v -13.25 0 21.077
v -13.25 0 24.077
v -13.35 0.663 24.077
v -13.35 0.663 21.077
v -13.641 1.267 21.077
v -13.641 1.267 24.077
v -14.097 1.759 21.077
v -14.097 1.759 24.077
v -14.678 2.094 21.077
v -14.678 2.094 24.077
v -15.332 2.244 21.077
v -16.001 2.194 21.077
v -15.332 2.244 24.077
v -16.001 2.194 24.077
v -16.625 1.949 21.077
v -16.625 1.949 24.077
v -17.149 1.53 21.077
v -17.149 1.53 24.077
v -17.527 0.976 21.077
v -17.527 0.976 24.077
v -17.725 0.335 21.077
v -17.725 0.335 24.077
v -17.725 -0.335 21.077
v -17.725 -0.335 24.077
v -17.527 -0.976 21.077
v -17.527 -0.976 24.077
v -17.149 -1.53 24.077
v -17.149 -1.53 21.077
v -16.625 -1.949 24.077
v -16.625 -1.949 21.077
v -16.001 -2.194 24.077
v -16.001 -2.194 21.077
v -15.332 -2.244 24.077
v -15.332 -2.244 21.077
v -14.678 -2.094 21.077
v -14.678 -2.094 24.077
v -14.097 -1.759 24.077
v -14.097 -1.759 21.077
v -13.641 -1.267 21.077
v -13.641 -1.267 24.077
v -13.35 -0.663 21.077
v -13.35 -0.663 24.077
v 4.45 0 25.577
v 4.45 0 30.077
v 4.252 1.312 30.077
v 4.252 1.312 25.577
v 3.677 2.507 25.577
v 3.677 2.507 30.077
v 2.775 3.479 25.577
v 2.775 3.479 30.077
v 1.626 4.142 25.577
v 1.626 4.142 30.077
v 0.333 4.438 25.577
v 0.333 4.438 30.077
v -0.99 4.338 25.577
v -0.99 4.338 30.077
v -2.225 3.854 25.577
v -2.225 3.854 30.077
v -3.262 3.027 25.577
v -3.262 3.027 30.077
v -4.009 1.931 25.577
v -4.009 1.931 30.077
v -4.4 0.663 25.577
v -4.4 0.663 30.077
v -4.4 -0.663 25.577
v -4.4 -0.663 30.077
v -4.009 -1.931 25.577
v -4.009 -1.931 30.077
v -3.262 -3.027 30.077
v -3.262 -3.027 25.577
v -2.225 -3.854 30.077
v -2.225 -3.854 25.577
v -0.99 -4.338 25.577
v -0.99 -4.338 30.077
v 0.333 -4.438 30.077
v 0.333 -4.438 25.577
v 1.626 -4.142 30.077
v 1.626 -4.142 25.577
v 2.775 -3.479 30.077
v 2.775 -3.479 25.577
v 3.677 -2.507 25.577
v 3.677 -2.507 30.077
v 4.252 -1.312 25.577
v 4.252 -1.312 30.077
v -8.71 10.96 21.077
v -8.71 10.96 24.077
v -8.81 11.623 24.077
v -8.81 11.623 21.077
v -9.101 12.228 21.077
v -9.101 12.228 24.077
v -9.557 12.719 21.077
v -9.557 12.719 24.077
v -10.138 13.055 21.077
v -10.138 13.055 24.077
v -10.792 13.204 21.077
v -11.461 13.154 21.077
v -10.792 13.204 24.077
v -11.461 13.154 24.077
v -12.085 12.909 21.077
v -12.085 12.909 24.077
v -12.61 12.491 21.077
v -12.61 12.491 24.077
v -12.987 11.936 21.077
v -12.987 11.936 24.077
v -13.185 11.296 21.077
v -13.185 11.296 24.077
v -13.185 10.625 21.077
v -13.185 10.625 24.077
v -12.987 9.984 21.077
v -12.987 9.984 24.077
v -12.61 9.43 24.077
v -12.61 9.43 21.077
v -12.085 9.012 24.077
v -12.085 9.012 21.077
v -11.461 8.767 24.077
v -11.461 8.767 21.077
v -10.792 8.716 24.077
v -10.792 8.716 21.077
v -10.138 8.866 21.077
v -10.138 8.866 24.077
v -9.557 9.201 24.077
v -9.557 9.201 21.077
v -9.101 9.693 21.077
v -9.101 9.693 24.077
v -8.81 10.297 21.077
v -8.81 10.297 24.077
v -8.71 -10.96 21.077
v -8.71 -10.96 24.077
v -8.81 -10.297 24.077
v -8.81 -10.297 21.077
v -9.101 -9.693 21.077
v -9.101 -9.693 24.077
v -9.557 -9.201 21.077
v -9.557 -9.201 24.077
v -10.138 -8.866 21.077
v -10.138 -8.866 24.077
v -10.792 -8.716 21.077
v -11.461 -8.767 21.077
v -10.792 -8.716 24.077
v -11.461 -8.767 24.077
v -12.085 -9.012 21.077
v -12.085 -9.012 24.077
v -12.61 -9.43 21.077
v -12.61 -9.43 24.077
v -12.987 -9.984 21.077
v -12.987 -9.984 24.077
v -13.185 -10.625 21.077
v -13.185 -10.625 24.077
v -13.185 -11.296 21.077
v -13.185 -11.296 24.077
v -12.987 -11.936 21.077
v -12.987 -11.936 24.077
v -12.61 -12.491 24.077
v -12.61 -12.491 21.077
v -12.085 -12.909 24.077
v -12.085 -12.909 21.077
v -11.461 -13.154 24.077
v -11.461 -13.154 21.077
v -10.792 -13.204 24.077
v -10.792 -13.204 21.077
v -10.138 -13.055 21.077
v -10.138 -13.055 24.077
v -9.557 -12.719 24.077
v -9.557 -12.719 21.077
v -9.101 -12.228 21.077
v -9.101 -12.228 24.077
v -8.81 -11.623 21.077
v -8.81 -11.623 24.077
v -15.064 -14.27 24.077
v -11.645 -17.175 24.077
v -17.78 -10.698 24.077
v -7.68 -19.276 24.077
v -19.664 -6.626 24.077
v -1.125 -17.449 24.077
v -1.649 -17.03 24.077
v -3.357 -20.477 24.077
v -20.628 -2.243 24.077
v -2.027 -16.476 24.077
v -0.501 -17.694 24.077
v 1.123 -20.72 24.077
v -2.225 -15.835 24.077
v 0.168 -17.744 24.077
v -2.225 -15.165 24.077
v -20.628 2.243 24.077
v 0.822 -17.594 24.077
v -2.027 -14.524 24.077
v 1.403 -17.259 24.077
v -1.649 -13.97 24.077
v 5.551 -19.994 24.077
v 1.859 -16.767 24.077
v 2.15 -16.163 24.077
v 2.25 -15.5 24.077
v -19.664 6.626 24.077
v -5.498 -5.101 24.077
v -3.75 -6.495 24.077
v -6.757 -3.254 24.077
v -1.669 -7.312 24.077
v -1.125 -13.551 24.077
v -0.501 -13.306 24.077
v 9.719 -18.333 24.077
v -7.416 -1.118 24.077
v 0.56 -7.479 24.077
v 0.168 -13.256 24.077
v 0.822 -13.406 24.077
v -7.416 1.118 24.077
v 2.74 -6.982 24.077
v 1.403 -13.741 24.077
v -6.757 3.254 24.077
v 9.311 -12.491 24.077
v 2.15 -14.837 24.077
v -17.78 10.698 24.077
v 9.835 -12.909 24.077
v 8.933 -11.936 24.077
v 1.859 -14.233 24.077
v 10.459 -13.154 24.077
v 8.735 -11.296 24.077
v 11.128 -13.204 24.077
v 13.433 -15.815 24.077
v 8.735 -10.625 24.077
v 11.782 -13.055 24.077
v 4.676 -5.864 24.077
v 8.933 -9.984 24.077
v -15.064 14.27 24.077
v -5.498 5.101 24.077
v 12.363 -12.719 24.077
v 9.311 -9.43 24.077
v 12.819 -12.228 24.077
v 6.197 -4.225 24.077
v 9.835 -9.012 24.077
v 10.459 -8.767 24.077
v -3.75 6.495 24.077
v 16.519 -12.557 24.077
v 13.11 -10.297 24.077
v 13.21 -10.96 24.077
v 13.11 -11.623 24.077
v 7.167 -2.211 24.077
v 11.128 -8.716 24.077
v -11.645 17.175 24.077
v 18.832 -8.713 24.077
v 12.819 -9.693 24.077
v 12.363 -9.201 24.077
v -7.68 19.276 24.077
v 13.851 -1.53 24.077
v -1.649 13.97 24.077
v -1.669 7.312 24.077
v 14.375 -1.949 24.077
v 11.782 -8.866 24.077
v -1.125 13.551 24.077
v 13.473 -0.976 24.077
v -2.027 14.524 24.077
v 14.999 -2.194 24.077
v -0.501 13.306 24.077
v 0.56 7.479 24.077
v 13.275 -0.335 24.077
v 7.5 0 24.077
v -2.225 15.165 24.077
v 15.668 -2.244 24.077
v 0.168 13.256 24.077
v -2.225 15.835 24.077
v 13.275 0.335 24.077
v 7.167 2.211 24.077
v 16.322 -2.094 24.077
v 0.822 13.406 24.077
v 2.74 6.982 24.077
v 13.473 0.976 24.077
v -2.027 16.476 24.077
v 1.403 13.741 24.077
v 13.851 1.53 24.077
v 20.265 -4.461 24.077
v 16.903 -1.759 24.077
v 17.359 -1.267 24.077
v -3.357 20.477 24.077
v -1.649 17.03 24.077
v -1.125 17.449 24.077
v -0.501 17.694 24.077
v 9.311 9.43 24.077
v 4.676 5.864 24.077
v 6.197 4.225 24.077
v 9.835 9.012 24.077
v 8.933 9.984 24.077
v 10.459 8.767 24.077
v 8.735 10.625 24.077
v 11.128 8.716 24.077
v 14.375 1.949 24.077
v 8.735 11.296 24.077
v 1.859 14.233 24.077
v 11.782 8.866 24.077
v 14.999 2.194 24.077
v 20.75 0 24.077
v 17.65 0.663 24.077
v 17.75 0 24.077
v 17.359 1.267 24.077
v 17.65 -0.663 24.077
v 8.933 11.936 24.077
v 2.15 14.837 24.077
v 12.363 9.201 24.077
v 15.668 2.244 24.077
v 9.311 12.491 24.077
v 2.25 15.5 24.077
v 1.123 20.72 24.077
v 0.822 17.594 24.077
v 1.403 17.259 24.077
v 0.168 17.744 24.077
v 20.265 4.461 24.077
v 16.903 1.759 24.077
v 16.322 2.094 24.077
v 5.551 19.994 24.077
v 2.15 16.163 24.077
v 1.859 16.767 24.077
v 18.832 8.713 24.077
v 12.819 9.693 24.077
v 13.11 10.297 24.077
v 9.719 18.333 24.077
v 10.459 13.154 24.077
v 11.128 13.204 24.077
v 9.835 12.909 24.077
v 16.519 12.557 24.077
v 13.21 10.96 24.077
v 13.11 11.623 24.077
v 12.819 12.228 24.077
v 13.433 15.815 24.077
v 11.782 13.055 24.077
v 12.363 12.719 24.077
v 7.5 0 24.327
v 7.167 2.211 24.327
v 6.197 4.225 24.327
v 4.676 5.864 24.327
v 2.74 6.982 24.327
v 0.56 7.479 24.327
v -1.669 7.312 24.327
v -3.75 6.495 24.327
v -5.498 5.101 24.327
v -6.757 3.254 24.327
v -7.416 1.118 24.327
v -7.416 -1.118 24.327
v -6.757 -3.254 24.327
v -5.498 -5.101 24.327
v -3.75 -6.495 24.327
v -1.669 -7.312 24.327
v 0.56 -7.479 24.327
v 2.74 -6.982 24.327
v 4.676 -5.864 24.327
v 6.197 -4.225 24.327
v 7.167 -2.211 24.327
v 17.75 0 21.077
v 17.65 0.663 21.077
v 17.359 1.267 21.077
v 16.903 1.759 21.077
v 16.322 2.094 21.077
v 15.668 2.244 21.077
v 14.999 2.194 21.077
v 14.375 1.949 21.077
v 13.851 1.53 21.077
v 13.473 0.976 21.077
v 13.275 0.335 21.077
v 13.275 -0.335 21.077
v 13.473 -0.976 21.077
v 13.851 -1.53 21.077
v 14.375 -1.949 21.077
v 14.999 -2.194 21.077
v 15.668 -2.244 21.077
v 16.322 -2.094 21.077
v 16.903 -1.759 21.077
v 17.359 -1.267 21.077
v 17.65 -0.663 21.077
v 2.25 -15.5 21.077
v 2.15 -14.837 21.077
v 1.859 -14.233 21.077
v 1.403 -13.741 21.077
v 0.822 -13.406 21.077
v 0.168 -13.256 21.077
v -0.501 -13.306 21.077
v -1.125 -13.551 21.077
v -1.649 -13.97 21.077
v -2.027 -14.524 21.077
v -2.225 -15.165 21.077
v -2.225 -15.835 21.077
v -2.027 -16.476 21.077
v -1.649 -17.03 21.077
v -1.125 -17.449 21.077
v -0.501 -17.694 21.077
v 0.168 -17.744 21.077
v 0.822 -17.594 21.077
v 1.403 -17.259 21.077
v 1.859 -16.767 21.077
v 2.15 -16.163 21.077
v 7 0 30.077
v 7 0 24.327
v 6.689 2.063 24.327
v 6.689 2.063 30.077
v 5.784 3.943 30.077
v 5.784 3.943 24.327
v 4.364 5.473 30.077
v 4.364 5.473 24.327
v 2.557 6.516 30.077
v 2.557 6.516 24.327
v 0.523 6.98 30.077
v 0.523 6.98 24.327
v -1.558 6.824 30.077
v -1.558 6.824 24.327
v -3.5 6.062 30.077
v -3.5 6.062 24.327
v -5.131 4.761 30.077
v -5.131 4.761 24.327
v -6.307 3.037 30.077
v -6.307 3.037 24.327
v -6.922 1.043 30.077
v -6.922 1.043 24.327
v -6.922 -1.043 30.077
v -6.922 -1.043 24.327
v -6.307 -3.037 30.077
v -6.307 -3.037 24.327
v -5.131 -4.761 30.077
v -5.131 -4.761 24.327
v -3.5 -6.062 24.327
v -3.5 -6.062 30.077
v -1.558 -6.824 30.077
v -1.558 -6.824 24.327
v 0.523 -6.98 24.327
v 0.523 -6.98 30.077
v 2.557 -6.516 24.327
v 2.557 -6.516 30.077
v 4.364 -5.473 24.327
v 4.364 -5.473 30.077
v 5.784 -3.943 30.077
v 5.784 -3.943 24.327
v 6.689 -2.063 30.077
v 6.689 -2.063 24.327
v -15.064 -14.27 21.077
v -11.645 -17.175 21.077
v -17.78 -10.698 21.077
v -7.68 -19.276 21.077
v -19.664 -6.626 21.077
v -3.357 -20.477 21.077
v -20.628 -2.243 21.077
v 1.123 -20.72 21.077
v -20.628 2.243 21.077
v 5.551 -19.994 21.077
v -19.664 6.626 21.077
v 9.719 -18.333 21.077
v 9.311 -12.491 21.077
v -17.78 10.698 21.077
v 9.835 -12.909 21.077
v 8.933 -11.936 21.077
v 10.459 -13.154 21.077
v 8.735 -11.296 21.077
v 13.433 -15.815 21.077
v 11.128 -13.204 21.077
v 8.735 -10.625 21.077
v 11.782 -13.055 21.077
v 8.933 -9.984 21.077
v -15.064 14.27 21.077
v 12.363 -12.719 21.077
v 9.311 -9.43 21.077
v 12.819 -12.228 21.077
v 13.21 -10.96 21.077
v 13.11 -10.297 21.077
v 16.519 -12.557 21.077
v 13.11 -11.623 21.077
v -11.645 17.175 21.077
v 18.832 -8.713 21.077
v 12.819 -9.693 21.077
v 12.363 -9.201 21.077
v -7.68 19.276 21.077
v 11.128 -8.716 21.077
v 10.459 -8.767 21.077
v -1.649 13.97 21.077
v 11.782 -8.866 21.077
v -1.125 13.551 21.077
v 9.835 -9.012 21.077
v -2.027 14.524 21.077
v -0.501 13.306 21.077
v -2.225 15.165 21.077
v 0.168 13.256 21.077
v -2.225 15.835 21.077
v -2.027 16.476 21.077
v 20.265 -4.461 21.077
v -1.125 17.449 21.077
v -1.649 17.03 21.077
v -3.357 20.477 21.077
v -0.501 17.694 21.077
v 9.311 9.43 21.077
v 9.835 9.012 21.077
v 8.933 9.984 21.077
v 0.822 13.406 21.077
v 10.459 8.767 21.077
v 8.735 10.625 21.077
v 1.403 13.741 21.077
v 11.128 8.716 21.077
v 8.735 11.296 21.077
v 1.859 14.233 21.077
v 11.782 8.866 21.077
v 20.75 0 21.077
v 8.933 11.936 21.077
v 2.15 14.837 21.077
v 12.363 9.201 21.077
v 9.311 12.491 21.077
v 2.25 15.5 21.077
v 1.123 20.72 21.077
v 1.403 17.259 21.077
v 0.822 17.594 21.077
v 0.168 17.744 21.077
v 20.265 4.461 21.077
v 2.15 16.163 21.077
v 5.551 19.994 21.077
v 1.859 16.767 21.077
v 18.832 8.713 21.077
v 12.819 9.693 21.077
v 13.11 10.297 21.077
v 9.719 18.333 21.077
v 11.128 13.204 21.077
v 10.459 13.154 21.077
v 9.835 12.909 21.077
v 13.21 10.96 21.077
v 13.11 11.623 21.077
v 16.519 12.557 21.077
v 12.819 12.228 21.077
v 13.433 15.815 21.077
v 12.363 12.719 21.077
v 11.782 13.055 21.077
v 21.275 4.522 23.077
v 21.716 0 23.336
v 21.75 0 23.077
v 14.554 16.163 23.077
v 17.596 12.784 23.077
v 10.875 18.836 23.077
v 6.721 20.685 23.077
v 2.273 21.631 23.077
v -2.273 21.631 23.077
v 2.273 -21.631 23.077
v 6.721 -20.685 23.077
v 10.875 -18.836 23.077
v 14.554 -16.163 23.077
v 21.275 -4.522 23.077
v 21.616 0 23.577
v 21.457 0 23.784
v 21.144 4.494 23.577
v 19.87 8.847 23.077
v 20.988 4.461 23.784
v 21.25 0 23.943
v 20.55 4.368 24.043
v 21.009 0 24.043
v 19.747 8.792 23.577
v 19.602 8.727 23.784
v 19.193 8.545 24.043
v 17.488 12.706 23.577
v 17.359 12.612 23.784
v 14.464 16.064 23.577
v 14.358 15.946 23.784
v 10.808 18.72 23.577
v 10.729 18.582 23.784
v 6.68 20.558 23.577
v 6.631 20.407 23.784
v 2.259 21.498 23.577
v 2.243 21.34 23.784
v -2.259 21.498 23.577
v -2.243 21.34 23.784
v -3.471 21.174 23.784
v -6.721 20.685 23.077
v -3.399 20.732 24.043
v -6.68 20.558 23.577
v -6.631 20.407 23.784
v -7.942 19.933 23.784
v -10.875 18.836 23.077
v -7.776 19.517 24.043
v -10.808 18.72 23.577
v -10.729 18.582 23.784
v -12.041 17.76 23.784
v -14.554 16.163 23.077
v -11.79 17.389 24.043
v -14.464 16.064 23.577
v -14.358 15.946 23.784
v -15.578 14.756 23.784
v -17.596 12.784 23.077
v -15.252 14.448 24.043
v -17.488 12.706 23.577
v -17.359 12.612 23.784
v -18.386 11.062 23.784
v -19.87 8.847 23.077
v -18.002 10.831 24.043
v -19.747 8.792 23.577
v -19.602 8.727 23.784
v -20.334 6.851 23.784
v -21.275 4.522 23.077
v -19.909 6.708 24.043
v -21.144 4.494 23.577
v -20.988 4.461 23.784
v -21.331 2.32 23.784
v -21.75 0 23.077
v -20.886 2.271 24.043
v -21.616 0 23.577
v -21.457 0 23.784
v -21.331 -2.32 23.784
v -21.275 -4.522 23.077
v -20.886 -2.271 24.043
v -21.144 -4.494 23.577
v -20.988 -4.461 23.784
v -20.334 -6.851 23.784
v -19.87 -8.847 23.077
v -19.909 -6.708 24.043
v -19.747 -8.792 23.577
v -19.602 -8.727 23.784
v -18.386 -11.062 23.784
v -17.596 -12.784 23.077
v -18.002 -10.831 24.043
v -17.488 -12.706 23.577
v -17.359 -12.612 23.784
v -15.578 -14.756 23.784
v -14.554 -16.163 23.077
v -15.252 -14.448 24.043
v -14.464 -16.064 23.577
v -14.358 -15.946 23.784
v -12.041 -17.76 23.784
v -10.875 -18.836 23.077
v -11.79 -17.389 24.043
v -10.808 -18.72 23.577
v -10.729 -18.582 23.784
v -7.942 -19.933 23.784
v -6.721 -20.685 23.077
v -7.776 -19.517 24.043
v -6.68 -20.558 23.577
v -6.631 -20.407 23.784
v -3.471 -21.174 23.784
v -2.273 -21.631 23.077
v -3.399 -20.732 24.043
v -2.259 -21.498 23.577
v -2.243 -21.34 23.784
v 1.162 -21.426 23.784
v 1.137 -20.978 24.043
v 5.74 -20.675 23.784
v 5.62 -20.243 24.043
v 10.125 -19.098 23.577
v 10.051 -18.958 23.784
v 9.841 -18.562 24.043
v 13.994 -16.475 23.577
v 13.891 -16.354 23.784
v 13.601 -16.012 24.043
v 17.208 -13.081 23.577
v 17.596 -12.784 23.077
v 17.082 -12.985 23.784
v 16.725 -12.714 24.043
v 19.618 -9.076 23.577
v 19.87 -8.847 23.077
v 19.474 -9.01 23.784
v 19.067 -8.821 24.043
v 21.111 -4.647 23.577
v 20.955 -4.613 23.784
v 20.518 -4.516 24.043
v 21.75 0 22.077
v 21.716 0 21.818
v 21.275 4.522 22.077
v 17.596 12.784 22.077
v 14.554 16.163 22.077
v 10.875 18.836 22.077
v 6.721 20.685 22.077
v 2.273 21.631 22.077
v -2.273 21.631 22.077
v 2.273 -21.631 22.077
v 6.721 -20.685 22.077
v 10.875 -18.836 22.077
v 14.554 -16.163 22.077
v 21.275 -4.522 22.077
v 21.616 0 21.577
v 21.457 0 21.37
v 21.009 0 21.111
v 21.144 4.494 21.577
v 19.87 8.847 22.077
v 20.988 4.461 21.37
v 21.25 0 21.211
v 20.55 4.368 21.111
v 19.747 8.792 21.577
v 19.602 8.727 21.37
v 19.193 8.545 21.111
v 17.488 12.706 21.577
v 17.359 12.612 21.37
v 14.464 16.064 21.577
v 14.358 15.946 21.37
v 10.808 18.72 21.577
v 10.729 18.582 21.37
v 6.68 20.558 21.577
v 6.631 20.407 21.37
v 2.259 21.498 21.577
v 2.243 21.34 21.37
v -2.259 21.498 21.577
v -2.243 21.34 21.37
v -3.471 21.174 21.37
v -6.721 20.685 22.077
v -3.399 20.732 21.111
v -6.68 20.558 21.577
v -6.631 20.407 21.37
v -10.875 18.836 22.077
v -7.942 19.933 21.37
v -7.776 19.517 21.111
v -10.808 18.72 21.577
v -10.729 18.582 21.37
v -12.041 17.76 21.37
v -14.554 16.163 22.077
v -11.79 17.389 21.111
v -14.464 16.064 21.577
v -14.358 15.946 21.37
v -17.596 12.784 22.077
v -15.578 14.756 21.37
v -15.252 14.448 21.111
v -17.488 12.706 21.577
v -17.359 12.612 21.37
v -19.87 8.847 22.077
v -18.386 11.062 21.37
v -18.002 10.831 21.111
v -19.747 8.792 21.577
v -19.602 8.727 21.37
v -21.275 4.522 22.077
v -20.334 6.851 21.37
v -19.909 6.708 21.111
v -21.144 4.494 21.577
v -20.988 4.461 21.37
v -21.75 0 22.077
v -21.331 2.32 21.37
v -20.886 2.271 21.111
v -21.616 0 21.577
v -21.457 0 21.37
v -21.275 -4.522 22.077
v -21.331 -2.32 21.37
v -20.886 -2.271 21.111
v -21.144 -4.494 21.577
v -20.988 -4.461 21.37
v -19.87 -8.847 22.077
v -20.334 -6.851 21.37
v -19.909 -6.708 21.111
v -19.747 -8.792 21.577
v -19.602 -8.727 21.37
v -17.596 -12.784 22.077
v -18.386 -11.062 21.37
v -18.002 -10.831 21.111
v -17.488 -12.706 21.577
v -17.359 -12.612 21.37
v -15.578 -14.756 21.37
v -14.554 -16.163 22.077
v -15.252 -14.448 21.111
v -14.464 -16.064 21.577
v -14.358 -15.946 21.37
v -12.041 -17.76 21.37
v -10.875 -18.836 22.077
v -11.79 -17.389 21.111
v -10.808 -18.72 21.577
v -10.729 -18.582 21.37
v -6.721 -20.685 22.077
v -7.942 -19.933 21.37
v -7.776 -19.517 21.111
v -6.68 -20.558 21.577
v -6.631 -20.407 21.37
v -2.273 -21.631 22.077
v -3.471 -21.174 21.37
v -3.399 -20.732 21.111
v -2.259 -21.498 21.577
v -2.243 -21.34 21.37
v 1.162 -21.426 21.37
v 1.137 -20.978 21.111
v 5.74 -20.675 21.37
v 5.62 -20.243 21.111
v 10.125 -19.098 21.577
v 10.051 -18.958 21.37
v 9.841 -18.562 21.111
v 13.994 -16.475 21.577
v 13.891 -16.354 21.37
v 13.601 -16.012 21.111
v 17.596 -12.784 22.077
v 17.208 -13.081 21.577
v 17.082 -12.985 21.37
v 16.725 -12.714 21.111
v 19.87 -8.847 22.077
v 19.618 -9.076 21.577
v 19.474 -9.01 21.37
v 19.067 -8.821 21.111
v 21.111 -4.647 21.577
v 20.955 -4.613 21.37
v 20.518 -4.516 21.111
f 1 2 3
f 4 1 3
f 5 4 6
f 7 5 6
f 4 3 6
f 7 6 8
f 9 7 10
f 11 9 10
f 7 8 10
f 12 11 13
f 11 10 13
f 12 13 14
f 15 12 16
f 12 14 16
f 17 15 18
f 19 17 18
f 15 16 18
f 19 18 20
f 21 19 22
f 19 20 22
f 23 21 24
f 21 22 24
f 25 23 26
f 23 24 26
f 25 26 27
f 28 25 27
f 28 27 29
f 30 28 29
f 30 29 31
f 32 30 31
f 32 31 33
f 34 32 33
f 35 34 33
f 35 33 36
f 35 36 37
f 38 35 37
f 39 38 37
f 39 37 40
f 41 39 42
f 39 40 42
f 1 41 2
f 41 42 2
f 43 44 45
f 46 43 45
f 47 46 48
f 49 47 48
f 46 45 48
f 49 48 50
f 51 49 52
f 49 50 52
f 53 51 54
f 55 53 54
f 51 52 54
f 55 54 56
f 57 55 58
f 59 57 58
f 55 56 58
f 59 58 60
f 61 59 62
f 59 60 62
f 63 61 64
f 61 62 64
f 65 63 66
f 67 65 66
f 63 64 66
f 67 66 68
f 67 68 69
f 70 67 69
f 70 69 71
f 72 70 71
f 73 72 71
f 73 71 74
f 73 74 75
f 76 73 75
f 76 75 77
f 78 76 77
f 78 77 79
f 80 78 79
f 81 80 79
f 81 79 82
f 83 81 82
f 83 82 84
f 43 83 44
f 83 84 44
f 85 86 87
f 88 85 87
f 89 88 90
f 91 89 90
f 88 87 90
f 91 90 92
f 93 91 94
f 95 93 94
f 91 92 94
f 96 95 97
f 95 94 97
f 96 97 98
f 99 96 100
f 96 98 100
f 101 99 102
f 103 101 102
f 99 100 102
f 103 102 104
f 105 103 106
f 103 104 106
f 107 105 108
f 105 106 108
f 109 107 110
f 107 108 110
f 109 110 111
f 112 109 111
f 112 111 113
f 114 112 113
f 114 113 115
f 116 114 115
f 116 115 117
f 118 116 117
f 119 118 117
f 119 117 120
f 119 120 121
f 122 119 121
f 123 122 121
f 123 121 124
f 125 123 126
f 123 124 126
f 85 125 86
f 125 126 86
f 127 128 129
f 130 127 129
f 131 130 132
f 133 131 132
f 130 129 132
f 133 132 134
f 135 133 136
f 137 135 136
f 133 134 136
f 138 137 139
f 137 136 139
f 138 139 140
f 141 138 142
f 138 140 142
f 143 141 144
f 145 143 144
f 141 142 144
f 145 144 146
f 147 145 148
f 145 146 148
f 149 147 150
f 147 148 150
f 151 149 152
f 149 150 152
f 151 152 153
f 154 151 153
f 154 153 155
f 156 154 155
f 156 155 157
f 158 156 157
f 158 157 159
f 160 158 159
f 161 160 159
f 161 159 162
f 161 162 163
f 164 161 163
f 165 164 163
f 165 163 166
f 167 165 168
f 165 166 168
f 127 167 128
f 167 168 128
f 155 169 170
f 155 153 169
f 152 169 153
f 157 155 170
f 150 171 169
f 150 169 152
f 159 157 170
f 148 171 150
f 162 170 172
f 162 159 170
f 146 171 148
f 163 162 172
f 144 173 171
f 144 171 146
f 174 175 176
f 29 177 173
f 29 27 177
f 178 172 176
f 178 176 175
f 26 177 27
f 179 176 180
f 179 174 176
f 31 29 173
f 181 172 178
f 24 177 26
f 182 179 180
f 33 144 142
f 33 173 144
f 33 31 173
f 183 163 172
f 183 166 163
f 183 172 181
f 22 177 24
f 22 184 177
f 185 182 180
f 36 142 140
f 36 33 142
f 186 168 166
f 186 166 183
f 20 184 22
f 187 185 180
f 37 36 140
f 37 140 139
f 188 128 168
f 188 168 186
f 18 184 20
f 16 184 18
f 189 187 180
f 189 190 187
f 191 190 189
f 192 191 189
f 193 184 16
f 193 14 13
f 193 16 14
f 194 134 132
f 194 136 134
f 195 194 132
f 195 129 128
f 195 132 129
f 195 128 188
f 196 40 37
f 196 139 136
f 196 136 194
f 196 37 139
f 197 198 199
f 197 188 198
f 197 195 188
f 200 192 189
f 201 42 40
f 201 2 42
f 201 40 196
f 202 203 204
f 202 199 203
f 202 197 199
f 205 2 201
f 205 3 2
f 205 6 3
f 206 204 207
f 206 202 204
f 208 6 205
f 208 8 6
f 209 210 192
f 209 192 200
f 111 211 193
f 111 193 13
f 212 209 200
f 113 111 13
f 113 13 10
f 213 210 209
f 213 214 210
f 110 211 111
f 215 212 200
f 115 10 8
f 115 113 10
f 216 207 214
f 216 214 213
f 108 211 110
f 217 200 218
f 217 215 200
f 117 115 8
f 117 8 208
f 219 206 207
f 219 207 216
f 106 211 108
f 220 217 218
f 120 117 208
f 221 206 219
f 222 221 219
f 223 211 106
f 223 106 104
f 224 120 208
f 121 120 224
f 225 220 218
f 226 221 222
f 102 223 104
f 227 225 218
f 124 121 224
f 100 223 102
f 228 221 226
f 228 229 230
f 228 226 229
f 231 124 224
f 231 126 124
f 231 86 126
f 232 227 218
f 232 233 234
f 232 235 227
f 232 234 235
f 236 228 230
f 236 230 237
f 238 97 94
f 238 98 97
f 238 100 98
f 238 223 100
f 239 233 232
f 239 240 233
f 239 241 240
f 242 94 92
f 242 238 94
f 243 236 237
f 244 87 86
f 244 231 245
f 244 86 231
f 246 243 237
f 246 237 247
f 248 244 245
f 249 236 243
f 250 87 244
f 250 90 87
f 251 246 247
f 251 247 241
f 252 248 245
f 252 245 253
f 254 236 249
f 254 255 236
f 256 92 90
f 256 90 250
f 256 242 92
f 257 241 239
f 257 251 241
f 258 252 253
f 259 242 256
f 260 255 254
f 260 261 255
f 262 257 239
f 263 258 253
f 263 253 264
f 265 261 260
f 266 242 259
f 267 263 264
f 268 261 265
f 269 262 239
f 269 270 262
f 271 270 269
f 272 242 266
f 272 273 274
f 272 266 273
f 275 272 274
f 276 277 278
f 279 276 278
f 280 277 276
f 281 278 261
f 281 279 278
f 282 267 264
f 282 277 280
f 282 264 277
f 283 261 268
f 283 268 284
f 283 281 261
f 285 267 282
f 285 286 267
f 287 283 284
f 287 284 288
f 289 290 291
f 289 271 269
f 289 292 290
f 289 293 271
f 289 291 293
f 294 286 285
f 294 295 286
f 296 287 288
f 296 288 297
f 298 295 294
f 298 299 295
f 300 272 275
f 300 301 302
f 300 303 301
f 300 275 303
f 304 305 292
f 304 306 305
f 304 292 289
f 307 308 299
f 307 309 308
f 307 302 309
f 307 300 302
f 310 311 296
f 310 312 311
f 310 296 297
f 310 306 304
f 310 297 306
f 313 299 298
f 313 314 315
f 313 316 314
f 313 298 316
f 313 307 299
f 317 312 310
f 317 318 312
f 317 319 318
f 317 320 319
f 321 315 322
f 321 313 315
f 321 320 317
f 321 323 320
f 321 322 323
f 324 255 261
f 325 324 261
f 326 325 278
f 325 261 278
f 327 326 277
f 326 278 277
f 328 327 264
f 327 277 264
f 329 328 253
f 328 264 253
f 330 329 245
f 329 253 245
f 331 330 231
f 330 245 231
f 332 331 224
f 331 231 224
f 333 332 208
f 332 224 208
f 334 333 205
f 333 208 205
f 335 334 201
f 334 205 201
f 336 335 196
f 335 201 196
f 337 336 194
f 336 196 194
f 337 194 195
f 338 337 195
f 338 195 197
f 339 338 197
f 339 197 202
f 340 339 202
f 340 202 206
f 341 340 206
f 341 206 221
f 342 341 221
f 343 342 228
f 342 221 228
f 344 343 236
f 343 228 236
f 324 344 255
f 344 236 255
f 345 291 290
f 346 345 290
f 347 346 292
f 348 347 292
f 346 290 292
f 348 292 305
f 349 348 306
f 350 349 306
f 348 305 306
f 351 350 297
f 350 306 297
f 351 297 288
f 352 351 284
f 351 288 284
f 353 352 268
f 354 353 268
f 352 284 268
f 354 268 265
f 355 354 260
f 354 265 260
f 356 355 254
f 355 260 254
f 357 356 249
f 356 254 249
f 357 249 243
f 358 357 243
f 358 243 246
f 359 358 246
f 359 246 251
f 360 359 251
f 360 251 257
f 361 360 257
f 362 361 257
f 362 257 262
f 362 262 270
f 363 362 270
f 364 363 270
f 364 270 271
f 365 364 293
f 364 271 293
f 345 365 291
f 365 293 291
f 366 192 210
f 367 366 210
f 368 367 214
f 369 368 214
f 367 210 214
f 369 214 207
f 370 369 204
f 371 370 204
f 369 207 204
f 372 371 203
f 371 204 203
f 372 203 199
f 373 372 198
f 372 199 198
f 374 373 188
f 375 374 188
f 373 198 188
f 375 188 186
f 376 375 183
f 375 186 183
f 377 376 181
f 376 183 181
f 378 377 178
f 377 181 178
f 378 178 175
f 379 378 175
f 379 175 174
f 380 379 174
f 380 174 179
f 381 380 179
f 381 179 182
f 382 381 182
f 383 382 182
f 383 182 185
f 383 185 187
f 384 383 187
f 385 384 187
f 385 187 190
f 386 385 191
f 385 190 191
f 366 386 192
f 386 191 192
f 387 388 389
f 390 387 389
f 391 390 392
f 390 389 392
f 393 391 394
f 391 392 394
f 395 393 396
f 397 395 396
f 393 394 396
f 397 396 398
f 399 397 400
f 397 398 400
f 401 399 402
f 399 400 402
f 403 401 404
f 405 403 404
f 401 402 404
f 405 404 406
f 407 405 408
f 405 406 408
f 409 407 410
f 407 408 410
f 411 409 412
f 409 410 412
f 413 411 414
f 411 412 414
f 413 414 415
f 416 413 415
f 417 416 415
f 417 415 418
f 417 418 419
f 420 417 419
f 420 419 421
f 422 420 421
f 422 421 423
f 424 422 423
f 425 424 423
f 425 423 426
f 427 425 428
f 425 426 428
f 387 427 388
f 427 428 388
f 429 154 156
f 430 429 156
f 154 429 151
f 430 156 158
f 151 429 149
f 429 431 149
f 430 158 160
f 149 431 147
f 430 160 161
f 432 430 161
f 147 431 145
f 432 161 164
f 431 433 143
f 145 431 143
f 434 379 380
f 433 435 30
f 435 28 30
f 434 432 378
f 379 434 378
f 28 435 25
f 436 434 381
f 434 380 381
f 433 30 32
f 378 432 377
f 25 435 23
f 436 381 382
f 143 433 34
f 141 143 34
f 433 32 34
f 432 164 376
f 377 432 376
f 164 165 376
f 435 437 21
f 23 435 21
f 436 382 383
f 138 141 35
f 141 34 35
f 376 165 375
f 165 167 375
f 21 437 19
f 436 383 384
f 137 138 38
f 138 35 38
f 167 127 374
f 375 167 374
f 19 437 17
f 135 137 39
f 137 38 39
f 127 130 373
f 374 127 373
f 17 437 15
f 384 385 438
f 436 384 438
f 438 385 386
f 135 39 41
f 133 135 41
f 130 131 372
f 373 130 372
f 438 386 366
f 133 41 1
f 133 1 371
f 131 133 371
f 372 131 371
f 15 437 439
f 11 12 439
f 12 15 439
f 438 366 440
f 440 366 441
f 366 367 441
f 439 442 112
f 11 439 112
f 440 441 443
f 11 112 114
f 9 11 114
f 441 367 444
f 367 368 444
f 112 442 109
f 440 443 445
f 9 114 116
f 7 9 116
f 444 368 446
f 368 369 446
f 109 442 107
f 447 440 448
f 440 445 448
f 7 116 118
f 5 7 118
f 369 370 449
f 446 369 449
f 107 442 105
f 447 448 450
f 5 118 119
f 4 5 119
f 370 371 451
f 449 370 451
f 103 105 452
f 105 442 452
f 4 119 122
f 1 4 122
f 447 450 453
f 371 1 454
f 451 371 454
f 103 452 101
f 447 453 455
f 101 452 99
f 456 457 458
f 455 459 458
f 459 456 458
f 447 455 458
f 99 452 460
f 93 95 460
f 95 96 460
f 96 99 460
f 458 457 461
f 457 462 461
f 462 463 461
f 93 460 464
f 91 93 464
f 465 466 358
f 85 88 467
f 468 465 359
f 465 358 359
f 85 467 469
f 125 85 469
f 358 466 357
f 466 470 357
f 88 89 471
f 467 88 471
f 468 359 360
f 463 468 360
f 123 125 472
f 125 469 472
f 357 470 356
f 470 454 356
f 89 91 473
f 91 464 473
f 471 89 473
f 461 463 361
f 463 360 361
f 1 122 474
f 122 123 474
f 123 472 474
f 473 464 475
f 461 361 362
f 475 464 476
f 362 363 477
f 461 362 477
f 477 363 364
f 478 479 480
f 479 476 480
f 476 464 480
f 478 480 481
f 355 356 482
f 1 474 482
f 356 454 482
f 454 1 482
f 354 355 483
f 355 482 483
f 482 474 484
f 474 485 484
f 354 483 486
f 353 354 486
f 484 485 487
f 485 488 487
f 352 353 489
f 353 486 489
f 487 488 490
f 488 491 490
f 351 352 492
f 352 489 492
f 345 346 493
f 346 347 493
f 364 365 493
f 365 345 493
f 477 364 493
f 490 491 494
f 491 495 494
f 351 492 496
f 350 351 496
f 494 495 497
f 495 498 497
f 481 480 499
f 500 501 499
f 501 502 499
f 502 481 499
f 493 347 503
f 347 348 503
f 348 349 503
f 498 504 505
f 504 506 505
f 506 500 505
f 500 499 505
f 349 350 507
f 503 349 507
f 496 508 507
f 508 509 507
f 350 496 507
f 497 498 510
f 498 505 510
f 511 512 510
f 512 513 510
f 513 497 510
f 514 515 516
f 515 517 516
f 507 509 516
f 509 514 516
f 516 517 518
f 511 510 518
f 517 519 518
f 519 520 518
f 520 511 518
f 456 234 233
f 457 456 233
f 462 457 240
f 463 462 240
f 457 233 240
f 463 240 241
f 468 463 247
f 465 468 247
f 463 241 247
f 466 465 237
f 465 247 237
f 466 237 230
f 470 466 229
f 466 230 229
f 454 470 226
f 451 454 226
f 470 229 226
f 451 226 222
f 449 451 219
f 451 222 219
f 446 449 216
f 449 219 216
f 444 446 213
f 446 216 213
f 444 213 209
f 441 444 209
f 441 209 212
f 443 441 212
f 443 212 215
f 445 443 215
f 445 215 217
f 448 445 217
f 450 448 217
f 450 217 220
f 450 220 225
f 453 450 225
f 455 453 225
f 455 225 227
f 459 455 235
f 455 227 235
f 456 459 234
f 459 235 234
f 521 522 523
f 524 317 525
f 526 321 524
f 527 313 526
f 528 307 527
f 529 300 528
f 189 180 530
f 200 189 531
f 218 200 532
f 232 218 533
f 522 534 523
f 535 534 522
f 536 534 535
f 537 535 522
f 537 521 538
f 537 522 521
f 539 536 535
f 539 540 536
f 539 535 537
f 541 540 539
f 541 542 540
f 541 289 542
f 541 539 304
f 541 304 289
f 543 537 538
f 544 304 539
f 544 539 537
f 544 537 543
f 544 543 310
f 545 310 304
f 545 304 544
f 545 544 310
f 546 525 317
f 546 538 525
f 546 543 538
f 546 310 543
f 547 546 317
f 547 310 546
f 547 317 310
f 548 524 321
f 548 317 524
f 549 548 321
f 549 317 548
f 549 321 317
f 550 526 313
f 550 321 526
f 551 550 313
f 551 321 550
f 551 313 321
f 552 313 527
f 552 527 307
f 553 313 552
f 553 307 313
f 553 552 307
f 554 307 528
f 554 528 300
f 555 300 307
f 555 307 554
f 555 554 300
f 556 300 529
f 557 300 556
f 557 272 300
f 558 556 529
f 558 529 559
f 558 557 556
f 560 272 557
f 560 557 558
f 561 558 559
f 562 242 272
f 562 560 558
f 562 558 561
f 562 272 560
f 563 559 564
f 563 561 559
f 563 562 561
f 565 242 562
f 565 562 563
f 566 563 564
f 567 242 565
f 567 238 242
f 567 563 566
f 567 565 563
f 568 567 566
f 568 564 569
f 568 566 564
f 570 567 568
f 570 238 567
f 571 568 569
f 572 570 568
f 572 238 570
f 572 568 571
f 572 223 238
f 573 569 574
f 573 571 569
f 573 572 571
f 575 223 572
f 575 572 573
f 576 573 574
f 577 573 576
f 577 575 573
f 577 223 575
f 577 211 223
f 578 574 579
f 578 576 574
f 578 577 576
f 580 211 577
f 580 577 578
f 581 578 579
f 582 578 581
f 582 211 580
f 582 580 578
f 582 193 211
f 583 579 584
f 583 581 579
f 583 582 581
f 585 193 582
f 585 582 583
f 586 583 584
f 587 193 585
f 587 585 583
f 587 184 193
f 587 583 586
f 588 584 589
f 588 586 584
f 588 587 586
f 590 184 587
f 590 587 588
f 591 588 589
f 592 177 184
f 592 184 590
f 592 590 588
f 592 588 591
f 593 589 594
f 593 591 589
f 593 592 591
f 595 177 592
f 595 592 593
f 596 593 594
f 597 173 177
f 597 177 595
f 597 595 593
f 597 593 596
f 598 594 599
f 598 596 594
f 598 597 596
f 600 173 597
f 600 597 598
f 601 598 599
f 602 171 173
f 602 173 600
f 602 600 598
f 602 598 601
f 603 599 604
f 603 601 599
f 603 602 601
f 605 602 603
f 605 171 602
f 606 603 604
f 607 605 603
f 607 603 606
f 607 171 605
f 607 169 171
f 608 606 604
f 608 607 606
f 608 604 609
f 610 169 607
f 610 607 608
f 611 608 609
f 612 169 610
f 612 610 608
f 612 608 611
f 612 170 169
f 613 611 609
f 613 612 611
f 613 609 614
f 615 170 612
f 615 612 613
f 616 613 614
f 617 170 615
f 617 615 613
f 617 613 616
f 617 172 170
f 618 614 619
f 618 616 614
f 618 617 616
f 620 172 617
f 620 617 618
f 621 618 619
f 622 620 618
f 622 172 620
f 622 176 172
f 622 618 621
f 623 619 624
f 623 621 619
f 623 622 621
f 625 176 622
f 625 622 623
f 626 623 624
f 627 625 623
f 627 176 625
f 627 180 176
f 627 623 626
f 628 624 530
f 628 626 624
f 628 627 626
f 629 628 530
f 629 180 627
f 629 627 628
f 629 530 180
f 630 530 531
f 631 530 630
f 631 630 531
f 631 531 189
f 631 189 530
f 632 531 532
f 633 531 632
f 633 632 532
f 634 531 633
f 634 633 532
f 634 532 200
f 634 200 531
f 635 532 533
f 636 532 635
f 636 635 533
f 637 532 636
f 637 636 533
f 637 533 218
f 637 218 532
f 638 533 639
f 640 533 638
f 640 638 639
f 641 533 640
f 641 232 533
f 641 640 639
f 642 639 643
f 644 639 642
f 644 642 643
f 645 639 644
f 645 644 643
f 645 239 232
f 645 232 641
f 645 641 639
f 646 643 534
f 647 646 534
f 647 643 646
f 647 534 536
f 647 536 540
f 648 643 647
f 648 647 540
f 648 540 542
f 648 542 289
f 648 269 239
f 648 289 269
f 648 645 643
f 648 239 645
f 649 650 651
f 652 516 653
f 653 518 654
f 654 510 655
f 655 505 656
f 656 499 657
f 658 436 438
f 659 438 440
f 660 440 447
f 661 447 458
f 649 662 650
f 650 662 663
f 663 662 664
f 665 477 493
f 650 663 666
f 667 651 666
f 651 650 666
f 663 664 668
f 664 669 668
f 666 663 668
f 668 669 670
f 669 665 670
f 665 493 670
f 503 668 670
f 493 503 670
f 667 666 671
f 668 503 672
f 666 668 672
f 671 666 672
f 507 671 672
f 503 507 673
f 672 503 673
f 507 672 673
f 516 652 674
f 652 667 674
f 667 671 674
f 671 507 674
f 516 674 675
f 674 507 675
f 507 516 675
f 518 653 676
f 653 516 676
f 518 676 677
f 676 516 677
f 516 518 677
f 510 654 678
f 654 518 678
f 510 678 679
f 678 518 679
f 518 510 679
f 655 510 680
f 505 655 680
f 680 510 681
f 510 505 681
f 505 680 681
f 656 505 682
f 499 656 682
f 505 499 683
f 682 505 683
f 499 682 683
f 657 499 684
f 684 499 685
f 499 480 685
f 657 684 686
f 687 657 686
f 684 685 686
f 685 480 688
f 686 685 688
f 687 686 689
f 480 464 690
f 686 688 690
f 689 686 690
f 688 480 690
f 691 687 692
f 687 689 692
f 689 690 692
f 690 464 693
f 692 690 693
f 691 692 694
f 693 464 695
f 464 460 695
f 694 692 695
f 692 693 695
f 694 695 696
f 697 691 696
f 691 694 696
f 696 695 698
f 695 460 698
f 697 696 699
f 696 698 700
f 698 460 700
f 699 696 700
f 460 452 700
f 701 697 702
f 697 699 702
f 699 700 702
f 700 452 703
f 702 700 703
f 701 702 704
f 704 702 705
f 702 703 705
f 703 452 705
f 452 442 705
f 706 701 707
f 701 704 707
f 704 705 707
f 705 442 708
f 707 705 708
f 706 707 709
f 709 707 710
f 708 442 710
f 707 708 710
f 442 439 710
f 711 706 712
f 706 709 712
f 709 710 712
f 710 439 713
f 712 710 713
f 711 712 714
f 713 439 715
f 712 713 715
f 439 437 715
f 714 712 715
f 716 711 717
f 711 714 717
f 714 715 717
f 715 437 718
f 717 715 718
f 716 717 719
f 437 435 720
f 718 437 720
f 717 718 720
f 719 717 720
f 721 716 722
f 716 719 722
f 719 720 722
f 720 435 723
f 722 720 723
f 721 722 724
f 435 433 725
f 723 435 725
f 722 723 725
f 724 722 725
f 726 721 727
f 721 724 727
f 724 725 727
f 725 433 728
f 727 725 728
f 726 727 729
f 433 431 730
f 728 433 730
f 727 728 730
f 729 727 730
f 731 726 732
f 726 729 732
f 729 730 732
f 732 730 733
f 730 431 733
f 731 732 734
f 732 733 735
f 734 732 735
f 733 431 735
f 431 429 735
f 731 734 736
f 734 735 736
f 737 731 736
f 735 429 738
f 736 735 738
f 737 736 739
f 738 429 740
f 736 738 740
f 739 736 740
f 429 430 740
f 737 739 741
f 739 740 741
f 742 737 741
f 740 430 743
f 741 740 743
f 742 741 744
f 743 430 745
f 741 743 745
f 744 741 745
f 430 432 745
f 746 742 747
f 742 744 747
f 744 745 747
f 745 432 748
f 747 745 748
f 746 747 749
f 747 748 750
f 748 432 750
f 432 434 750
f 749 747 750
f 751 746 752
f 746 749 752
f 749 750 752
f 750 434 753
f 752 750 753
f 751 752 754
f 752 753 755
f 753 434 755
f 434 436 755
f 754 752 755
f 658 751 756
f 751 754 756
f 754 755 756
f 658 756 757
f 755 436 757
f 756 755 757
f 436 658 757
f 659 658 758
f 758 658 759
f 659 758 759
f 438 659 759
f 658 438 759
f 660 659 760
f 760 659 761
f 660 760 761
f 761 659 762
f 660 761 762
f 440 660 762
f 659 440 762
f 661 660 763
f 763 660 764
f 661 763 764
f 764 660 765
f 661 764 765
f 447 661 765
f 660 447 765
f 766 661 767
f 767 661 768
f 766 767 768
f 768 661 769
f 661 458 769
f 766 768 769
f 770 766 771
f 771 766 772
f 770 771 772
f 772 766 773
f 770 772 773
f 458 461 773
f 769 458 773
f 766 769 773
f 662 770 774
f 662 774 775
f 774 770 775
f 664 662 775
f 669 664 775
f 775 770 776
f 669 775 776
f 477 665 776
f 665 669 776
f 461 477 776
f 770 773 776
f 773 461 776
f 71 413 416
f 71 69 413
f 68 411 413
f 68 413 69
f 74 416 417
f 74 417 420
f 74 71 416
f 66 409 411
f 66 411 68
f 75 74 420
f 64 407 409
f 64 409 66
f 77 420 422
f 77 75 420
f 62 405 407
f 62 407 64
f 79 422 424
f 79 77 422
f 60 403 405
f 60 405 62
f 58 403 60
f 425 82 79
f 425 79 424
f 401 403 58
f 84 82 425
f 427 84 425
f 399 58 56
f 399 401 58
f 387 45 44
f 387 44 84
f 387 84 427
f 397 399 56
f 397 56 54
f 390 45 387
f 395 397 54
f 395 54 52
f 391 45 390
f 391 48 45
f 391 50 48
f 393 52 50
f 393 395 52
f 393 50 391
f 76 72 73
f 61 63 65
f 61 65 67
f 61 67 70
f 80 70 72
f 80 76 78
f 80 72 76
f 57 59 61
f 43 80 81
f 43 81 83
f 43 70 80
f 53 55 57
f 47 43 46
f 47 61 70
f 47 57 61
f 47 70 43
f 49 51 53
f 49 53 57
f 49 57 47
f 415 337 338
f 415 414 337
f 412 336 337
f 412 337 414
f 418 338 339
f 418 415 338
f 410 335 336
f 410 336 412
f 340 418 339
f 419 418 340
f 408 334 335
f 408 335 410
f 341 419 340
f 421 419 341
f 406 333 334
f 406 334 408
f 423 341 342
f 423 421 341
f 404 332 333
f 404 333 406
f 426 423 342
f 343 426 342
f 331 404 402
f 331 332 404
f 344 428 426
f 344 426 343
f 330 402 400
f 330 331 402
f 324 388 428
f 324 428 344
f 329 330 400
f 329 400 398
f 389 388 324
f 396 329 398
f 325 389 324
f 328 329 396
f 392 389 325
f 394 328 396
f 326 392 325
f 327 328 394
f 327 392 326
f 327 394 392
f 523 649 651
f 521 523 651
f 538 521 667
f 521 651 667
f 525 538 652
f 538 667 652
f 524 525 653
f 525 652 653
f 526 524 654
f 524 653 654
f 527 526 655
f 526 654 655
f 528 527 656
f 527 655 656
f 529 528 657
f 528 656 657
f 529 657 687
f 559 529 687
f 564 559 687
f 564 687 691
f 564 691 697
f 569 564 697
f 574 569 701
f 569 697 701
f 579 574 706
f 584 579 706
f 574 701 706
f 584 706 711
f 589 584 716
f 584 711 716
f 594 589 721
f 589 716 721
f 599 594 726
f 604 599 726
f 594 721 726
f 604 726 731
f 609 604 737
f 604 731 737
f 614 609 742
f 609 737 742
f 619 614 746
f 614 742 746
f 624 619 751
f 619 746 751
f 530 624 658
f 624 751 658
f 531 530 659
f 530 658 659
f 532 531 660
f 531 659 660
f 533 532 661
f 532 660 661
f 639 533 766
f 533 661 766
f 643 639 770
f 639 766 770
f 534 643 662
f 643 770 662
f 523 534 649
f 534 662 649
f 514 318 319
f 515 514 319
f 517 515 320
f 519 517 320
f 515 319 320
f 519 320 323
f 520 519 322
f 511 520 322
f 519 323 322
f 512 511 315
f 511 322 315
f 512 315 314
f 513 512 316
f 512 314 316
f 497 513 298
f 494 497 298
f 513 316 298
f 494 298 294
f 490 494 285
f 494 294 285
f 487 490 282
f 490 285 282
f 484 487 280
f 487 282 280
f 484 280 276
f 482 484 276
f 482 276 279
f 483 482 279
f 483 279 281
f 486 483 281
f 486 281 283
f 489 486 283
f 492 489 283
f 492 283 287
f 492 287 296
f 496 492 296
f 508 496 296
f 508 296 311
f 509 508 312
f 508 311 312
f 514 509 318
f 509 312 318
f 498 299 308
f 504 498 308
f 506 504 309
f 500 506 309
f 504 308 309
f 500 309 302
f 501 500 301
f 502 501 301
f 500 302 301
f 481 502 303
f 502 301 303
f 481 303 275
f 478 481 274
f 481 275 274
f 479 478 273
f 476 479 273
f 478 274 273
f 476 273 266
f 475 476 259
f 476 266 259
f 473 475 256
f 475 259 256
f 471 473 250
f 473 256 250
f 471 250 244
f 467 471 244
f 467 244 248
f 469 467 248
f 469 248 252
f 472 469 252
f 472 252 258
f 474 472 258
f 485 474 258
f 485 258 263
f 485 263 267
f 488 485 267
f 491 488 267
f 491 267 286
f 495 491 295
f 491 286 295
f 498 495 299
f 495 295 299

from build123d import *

# Parameters (mm, degrees)
SKETCH1_R           = 217.5
BOSS_EXTRUDE1_DEPTH = 30
SKETCH2_R           = 75
BOSS_EXTRUDE2_DEPTH = 2.5
SKETCH3_R           = 70
BOSS_EXTRUDE3_DEPTH = 57.5
SKETCH12_R          = 22.5
CUT_EXTRUDE2_DEPTH  = 30
FILLET2_R           = 10
SCALE2_SCALE        = 0.1
SKETCH14_R          = 4.45
CUT_EXTRUDE3_DEPTH  = 4.5


with BuildPart() as part:
    # Sketch1 → Boss-Extrude1 (new body)
    with BuildSketch(Plane.XY):
        Circle(SKETCH1_R)
    extrude(amount=BOSS_EXTRUDE1_DEPTH)

    # Sketch2 → Boss-Extrude2 (add)
    with BuildSketch(Plane.XY.offset(30)):
        Circle(SKETCH2_R)
    extrude(amount=BOSS_EXTRUDE2_DEPTH)

    # Sketch3 → Boss-Extrude3 (add)
    with BuildSketch(Plane.XY.offset(32.5)):
        Circle(SKETCH3_R)
    extrude(amount=BOSS_EXTRUDE3_DEPTH)

    # Sketch12 → Cut-Extrude2 (cut)
    with BuildSketch(Plane.XY.offset(30)):
        with Locations((0, 155)):
            Circle(SKETCH12_R)
        with Locations((109.601551084, 109.601551084)):
            Circle(SKETCH12_R)
        with Locations((155, 0)):
            Circle(SKETCH12_R)
        with Locations((109.601551084, -109.601551084)):
            Circle(SKETCH12_R)
        with Locations((0, -155)):
            Circle(SKETCH12_R)
        with Locations((-109.601551084, -109.601551084)):
            Circle(SKETCH12_R)
        with Locations((-155, 0)):
            Circle(SKETCH12_R)
        with Locations((-109.601551084, 109.601551084)):
            Circle(SKETCH12_R)
    extrude(amount=-CUT_EXTRUDE2_DEPTH, mode=Mode.SUBTRACT)

    # Fillet2
    fillet2_edges = [part.edges().sort_by_distance(p)[0] for p in [
        (-217.5, 0, 0),
        (-217.5, 0, 30),
    ]]
    fillet(fillet2_edges, radius=FILLET2_R)


with BuildPart() as part_1:
    # Scale2: scaled about (0, 0, 23.418586113)
    add(part.part.scale(SCALE2_SCALE).moved(Location((0, 0, 21.076727502))))

    # Sketch14 → Cut-Extrude3 (cut)
    with BuildSketch(Plane.XY.offset(30.076727502)):
        Circle(SKETCH14_R)
    extrude(amount=-CUT_EXTRUDE3_DEPTH, mode=Mode.SUBTRACT)


solid = part_1.part
